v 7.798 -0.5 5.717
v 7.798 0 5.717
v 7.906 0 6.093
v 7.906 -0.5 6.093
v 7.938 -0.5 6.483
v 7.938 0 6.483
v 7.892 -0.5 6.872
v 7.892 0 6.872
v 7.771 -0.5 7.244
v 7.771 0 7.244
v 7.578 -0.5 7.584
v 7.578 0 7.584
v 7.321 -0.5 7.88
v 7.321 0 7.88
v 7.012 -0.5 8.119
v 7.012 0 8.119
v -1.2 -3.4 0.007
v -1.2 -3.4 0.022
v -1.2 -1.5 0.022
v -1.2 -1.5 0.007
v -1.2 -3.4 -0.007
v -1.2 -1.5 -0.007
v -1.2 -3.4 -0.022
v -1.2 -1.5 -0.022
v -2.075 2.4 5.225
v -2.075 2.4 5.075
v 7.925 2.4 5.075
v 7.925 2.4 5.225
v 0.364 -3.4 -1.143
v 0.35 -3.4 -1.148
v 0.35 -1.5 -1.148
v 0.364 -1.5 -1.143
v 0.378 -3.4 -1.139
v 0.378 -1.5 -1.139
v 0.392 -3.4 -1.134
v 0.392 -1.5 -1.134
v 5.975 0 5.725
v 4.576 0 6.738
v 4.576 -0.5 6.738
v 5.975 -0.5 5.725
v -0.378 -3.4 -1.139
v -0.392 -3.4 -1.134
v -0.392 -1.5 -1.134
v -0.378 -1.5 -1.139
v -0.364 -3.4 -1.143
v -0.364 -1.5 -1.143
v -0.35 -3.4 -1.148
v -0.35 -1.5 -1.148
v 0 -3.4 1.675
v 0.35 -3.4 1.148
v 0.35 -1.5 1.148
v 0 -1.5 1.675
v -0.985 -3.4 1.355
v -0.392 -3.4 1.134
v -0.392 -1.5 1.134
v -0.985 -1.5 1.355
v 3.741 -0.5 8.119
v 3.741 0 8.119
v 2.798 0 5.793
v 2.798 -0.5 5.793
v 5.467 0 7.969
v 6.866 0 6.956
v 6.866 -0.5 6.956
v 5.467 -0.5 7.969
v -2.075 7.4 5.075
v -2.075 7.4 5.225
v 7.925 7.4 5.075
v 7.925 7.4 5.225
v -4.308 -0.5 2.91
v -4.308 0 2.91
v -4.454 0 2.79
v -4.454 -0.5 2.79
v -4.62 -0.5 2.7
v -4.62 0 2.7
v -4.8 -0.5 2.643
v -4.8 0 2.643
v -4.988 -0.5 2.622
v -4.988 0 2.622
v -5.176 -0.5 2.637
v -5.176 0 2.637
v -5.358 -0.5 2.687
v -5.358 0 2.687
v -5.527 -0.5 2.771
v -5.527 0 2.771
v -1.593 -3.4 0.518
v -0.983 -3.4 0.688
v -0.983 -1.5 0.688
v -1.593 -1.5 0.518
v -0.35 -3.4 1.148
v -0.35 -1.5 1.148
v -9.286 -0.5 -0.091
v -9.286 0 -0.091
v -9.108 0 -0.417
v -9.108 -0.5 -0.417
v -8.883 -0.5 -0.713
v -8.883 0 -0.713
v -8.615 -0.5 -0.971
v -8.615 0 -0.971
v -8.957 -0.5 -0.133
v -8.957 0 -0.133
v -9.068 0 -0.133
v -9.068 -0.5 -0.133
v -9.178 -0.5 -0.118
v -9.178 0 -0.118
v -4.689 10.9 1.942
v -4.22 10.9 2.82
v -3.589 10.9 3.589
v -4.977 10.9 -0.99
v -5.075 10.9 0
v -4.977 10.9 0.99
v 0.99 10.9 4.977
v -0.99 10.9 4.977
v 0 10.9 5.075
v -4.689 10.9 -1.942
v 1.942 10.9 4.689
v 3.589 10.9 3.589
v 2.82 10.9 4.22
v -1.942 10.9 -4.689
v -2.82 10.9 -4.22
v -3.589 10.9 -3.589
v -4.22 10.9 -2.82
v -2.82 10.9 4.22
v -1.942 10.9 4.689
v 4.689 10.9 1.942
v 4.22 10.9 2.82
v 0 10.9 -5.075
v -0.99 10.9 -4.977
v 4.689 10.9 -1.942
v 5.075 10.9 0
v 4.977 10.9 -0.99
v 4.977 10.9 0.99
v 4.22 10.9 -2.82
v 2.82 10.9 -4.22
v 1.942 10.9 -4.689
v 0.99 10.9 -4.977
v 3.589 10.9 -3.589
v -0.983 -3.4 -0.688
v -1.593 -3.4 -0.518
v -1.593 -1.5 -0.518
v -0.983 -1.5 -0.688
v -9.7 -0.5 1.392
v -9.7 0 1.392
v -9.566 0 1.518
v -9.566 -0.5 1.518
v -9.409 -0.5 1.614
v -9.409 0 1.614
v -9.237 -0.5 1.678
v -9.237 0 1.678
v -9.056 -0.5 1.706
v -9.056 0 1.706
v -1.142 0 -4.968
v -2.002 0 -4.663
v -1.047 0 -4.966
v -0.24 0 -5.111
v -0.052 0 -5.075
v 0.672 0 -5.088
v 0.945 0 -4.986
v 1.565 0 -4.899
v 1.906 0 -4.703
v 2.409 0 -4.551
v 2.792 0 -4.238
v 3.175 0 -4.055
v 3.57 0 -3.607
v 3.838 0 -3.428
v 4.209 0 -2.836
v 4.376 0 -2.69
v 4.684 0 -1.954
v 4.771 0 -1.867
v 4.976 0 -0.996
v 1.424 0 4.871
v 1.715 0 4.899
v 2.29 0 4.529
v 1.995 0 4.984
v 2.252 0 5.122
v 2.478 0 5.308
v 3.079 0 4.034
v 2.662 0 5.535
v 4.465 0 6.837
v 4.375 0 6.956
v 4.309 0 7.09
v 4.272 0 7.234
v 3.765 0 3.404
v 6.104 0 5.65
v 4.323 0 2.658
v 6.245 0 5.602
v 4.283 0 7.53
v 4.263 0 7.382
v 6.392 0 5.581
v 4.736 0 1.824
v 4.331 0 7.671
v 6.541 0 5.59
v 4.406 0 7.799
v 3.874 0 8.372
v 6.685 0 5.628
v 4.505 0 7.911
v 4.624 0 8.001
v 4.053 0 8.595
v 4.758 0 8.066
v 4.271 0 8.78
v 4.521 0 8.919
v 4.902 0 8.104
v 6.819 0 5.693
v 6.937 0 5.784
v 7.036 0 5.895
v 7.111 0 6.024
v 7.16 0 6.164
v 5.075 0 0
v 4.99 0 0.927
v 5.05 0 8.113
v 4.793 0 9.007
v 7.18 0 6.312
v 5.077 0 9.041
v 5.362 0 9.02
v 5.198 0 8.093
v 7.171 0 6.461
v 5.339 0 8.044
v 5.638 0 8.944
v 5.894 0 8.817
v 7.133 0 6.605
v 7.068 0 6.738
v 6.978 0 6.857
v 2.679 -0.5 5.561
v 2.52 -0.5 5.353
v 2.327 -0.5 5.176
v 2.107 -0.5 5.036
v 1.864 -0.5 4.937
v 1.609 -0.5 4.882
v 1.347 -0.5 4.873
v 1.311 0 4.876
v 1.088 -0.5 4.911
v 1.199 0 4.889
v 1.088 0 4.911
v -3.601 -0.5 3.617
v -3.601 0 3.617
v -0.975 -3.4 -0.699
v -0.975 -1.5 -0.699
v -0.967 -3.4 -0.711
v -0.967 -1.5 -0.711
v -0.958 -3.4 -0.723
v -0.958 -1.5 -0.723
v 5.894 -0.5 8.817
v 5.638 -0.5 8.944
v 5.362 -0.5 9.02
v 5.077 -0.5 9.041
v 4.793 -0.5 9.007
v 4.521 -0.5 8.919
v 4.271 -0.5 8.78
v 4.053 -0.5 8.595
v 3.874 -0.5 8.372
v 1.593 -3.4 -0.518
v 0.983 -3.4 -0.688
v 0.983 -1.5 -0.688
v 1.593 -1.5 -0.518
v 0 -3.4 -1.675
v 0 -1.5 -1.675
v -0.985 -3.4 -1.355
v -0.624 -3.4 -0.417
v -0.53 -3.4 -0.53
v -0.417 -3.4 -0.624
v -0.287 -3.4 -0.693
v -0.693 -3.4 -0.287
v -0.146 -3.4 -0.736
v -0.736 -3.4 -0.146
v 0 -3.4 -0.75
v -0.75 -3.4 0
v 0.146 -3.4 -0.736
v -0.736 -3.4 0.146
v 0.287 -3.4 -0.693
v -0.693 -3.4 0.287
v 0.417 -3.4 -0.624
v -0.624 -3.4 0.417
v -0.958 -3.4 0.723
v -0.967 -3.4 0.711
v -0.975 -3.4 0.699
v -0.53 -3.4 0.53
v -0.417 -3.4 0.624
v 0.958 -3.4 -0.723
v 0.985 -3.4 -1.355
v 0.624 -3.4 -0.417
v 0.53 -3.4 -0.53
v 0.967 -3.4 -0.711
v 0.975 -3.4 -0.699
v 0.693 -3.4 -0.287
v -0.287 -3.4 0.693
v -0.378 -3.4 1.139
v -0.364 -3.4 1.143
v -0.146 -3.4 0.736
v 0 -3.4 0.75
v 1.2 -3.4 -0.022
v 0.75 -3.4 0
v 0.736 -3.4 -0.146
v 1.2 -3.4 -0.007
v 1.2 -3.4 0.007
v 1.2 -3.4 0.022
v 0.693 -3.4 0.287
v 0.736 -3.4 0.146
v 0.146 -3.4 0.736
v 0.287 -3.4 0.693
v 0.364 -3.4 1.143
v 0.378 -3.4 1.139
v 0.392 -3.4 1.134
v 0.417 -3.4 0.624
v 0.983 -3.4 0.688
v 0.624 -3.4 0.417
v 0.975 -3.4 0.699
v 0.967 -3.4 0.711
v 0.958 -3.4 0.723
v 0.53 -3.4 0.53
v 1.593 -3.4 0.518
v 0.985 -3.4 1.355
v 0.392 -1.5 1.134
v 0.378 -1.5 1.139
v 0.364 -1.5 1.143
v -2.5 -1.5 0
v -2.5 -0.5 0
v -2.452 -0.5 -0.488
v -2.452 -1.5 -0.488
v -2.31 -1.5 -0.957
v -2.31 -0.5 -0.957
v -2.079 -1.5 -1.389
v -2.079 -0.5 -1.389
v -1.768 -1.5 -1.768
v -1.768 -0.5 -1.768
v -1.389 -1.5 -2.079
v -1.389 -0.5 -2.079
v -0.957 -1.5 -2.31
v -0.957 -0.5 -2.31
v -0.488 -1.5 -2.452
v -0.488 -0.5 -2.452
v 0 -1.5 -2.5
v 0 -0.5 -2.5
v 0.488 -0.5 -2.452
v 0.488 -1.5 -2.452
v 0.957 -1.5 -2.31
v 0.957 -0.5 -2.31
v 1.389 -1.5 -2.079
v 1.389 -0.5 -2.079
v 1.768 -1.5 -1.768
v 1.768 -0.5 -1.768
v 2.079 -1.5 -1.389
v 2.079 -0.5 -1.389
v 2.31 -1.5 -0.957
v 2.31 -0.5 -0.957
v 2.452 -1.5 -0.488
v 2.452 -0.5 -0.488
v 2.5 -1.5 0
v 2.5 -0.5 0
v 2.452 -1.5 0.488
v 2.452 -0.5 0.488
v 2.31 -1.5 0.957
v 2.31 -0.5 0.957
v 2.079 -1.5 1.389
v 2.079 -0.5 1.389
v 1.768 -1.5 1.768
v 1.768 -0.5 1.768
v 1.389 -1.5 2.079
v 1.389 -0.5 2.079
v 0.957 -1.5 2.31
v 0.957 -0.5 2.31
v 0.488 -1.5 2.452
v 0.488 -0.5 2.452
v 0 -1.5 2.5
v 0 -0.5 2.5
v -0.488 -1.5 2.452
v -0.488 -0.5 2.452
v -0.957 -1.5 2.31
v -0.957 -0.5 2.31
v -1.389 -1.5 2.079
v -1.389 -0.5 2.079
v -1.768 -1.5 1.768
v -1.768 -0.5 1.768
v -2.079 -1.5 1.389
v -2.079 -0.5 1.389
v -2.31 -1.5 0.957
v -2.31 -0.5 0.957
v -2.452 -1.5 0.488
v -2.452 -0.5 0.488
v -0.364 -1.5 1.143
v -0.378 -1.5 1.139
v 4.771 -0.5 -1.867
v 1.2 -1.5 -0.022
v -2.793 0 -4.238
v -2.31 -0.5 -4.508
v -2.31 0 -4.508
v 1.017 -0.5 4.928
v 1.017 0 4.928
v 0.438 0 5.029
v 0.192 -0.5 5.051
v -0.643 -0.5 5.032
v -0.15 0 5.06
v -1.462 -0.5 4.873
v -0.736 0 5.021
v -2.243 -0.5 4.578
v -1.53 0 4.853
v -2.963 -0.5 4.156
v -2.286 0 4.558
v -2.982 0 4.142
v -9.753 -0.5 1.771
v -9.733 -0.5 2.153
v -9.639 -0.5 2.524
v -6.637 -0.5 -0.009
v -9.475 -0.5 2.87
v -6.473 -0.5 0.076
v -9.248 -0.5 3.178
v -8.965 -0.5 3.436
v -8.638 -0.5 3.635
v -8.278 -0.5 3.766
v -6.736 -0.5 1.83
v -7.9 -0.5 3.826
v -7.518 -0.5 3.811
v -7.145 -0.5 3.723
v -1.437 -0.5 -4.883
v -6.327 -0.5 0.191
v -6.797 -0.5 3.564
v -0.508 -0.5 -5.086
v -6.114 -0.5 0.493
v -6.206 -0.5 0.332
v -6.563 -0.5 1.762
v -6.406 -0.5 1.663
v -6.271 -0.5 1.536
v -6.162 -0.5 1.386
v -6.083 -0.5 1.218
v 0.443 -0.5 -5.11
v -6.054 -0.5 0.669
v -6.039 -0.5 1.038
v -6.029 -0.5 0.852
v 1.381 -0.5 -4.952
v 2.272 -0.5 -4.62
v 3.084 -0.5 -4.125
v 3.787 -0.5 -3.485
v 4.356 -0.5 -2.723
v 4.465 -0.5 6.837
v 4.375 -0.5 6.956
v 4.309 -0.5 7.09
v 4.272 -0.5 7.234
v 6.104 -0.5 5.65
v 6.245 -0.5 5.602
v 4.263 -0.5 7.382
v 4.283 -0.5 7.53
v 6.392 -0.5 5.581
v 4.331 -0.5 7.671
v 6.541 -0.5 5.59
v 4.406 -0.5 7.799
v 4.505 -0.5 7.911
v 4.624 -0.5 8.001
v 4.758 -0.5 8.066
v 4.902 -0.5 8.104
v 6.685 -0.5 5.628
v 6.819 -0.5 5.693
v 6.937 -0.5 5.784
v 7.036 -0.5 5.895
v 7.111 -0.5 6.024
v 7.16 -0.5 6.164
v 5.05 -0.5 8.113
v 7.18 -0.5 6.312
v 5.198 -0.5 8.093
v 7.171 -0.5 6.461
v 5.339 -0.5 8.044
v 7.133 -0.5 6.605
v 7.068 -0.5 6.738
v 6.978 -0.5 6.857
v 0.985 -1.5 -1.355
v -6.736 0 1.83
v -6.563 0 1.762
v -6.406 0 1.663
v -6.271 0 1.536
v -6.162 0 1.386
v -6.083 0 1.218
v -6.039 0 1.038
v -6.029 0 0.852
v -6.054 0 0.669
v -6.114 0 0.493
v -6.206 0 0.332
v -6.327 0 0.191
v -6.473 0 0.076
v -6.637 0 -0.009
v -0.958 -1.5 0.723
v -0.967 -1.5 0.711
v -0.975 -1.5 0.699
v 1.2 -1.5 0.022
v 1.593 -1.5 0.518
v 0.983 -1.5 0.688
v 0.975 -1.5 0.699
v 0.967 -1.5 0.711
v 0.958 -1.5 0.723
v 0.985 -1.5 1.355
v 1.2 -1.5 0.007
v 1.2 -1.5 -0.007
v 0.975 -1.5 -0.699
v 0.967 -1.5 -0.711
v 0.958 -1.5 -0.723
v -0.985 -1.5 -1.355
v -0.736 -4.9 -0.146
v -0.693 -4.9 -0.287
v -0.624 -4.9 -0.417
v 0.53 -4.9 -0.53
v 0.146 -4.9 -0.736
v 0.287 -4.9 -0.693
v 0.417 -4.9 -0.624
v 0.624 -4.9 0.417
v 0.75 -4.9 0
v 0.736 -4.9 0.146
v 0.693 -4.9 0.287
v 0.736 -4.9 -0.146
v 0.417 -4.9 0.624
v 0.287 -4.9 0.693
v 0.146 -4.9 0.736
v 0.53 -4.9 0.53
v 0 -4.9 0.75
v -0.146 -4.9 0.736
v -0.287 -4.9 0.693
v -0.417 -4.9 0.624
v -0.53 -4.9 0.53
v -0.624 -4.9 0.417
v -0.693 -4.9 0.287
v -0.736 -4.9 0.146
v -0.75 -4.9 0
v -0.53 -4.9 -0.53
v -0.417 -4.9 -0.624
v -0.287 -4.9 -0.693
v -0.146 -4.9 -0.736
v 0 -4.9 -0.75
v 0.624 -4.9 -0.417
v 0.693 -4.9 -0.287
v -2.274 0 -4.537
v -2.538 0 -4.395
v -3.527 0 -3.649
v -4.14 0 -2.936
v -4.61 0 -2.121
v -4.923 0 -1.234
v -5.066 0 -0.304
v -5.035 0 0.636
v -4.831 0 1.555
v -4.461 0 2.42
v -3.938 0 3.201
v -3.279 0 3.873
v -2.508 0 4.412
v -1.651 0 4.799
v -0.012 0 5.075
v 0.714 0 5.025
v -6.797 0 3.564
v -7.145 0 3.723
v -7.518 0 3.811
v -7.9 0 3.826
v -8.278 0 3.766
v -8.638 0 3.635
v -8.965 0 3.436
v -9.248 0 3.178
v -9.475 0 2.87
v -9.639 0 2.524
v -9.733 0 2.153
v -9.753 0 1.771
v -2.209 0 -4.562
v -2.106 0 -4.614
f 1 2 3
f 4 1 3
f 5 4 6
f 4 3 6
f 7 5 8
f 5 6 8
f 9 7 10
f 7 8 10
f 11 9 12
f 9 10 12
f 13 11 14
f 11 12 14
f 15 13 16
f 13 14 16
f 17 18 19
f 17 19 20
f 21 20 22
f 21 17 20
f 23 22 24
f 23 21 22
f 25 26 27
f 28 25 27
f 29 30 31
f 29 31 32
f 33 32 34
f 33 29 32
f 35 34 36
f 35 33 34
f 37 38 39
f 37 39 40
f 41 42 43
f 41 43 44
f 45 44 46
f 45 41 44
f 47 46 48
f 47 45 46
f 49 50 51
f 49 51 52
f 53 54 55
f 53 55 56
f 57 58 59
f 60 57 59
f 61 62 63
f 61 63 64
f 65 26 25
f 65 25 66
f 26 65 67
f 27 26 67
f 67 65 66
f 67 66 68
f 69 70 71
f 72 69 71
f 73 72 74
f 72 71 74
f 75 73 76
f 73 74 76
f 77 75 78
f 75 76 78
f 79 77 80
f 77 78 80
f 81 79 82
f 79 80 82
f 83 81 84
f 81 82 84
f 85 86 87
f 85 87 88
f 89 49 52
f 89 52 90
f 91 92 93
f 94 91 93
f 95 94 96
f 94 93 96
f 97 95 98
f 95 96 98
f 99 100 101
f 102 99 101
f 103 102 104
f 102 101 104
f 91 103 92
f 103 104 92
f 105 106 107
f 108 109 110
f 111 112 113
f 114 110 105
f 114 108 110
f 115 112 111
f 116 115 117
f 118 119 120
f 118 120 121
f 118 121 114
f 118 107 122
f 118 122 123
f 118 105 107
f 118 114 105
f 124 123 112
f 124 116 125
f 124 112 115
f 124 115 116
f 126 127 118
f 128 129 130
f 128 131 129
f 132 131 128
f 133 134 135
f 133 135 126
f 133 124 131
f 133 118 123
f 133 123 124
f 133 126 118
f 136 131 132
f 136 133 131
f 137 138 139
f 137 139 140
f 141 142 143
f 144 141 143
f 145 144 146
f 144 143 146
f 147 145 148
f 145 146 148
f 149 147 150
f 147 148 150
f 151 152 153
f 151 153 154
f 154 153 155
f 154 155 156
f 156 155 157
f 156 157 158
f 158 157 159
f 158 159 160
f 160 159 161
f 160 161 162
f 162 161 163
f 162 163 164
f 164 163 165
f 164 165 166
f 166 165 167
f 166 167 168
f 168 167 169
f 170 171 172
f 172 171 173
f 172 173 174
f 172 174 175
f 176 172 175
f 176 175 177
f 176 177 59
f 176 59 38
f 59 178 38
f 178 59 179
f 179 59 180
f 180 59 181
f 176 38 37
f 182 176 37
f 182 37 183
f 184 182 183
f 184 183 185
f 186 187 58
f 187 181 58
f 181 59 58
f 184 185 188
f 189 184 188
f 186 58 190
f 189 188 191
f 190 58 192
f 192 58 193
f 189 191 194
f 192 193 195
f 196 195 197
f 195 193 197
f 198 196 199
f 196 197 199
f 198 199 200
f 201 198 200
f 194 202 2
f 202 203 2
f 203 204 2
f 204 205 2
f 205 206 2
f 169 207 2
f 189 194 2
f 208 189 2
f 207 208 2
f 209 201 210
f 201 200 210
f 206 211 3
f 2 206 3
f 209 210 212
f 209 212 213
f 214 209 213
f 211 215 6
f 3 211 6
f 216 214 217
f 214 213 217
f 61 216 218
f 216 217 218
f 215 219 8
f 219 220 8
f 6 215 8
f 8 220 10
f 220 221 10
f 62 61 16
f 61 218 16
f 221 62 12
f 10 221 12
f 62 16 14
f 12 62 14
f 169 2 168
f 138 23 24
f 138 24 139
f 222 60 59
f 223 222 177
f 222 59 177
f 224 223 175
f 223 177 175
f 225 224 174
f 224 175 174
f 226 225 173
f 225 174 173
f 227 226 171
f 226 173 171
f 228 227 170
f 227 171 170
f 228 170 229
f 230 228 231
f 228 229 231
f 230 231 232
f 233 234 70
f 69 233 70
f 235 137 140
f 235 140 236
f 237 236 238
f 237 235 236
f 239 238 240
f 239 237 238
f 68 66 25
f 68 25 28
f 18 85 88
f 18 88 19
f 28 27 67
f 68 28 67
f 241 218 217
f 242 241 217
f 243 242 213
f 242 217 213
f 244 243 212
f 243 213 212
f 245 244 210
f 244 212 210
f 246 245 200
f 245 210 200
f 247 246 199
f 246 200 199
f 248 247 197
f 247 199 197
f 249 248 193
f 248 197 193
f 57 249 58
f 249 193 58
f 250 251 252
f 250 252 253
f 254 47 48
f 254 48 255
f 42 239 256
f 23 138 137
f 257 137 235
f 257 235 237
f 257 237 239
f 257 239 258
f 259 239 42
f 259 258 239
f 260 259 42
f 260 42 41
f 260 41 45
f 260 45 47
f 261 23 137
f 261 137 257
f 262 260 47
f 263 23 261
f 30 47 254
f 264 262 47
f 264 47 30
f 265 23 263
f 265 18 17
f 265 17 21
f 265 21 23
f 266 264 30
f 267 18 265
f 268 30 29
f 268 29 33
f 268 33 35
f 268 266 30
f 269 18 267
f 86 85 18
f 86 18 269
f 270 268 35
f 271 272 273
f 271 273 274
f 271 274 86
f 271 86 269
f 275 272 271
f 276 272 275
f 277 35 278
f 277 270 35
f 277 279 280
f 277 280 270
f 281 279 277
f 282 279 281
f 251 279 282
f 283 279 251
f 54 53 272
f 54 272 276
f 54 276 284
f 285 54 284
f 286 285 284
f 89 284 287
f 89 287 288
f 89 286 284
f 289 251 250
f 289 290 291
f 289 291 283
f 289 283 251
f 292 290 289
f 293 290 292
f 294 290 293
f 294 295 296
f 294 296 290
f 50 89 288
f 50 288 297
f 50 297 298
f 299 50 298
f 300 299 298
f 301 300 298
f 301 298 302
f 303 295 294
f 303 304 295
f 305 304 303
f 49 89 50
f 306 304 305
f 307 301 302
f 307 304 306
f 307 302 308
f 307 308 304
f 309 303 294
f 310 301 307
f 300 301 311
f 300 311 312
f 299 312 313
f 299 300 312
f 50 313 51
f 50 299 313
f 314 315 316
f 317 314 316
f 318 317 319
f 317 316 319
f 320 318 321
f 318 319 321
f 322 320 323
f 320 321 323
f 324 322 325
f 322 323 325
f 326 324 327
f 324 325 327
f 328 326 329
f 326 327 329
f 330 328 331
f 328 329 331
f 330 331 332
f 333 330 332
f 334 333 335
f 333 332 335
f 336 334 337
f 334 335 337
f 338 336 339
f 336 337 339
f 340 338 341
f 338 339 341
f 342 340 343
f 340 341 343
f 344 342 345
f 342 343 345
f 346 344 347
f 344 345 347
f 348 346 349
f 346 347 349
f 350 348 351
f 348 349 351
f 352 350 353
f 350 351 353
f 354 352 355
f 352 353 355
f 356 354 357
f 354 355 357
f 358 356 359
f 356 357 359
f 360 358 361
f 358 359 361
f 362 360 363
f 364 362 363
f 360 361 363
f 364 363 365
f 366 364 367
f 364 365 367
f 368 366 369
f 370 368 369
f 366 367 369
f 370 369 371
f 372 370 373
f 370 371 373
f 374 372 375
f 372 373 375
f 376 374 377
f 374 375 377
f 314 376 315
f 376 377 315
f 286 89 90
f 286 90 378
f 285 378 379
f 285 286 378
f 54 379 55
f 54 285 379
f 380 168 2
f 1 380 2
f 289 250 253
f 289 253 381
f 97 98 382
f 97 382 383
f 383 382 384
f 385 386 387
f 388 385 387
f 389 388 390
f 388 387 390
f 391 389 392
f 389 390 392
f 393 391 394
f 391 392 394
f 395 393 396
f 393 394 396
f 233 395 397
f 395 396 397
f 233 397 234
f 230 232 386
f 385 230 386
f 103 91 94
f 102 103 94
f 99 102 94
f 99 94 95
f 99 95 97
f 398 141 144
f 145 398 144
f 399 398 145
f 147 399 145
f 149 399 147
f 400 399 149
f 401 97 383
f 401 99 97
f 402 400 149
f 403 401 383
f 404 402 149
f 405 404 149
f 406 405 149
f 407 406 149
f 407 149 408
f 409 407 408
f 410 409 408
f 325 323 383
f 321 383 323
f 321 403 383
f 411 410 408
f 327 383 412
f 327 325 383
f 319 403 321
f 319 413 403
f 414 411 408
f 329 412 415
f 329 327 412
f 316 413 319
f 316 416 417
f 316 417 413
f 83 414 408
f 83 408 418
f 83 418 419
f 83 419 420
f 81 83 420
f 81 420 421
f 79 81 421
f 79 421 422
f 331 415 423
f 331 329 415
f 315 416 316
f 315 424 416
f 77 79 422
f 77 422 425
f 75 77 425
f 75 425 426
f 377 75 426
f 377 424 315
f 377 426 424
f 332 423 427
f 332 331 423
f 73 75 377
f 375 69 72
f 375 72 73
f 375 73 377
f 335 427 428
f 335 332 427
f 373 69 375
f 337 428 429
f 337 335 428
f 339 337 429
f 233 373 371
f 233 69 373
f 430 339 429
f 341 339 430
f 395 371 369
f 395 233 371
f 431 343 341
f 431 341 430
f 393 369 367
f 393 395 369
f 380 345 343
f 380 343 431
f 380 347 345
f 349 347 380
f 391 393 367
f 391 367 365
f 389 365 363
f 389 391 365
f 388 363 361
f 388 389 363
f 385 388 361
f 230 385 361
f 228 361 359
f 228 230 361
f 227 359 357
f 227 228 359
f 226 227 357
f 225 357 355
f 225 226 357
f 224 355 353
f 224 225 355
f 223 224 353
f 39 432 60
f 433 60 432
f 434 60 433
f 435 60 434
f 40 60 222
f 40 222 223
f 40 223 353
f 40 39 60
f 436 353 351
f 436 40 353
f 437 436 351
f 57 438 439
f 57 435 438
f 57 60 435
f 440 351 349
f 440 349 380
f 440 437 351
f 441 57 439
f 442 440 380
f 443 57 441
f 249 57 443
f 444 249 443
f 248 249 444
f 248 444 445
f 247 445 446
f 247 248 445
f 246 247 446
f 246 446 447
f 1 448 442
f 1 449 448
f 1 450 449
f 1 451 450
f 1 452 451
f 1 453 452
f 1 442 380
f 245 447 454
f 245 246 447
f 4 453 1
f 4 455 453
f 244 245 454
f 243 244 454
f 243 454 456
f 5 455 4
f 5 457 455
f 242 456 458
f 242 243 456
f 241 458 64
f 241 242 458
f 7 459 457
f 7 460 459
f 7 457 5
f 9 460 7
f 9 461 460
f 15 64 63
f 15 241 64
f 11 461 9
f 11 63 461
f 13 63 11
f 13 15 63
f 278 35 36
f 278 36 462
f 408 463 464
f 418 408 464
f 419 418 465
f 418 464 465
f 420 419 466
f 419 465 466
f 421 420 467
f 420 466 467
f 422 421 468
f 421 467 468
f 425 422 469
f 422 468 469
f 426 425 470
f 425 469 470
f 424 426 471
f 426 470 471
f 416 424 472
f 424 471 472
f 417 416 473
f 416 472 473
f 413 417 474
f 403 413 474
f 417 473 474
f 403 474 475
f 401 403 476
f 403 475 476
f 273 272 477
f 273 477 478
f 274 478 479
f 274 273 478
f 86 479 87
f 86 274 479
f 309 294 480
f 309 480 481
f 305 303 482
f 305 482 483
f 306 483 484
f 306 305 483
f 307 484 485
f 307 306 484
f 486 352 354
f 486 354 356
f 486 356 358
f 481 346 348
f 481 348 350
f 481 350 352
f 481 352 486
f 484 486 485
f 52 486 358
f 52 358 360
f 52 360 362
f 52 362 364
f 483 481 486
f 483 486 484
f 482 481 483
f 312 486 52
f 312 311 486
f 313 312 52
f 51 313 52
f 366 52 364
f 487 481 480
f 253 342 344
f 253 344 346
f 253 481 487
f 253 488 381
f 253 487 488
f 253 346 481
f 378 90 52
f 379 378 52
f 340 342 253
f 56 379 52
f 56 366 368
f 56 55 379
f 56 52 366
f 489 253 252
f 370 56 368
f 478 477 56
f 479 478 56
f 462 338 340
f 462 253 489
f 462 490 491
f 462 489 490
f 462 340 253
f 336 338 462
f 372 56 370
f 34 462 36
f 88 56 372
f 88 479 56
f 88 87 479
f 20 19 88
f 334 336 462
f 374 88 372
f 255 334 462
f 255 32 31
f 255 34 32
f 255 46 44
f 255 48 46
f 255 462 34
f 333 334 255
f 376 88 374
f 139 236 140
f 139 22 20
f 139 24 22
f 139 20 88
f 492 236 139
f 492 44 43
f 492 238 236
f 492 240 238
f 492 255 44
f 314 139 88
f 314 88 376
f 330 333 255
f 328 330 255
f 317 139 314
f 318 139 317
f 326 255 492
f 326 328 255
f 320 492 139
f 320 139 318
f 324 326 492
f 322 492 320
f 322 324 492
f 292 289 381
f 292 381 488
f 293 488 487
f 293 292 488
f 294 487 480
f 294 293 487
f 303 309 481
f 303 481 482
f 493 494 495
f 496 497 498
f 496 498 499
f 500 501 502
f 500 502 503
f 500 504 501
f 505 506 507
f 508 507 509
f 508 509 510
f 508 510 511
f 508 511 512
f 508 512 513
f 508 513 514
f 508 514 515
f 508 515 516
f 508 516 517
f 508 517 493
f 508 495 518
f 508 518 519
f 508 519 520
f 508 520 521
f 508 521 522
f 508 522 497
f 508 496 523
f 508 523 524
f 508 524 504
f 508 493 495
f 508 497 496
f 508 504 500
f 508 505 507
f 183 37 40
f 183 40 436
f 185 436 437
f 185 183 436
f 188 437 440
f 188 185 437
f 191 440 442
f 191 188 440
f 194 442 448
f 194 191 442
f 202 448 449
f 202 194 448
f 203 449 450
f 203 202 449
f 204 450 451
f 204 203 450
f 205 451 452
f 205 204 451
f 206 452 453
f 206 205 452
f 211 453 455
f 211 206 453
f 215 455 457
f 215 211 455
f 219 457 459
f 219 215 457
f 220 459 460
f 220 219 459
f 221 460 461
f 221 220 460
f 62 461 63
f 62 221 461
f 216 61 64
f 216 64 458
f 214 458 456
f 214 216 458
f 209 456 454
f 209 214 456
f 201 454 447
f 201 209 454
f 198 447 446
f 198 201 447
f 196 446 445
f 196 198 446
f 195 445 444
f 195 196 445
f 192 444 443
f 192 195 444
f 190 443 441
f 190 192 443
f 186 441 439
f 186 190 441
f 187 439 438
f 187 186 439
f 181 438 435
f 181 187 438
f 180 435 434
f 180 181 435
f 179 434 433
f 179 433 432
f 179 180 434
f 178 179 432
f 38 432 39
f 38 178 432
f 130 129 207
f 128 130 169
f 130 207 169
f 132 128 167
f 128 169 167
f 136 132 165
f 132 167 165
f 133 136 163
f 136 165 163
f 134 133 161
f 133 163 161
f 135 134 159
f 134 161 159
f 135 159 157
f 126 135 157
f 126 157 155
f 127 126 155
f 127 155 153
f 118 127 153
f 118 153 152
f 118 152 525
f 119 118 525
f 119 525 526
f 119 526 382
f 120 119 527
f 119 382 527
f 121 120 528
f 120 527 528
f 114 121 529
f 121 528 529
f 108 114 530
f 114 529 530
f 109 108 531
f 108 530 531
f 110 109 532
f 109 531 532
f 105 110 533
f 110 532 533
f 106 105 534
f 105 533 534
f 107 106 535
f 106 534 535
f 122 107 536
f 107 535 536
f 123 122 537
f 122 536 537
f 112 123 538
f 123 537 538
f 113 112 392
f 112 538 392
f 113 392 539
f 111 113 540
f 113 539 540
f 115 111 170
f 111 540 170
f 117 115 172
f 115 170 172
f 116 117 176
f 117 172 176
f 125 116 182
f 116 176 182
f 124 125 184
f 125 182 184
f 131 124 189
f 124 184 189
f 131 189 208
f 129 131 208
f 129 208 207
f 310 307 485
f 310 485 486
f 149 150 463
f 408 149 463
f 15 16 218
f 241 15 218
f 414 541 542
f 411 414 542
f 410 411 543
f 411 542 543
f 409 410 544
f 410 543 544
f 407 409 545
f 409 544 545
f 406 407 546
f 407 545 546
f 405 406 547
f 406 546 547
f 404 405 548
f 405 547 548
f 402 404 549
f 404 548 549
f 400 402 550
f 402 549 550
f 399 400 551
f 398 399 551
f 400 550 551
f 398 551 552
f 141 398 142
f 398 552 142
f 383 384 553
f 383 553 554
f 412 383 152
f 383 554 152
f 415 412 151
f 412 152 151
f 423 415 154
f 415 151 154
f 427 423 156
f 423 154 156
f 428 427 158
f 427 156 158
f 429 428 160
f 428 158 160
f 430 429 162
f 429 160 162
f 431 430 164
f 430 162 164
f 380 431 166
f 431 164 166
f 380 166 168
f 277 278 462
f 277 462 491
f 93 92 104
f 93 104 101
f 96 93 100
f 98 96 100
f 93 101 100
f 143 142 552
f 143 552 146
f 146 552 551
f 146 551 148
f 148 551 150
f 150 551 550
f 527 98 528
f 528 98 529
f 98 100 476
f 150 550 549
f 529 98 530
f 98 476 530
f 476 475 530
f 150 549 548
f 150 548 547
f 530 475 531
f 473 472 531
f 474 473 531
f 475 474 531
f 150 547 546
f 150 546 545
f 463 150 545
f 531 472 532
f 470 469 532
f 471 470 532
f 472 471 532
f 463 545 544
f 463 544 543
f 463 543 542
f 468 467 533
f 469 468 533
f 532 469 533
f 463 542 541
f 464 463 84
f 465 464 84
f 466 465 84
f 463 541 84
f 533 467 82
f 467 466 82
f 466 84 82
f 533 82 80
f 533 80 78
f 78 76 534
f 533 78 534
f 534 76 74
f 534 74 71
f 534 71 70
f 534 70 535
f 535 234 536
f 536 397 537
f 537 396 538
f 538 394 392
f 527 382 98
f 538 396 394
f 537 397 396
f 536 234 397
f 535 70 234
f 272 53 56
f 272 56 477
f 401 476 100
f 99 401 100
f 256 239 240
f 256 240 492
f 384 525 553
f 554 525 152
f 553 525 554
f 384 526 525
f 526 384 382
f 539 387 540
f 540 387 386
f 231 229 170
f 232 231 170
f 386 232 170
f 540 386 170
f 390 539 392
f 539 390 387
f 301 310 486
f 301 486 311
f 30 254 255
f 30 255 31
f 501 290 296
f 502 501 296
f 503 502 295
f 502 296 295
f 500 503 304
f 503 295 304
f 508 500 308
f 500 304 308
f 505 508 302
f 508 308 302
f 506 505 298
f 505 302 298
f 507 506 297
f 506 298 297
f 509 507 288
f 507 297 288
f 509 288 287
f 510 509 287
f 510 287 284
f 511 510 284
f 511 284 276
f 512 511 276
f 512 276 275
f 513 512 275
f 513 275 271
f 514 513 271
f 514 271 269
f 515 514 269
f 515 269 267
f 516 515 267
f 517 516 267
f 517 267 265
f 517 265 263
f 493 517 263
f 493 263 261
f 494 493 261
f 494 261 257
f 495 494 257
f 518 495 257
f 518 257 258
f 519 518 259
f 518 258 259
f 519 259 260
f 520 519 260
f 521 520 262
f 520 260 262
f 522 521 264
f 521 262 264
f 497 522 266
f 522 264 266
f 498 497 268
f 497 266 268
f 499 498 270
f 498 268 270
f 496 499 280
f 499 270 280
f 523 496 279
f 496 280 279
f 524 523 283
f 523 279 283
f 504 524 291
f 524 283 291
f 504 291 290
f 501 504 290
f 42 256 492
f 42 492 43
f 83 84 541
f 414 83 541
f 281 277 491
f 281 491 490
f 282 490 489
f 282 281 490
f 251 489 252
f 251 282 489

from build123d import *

# Parameters (mm, degrees)
SKETCH1_R           = 5.075
BOSS_EXTRUDE1_DEPTH = 10.9
BOSS_EXTRUDE2_DEPTH = 0.5
SKETCH3_R           = 2.5
BOSS_EXTRUDE3_DEPTH = 1
SKETCH5_R           = 0.75
BOSS_EXTRUDE4_DEPTH = 3.4
BOSS_EXTRUDE5_DEPTH = 2
SKETCH8_W           = 10
SKETCH8_H           = 5
BOSS_EXTRUDE6_DEPTH = 0.15


with BuildPart() as part:
    # Sketch1 → Boss-Extrude1 (new body)
    with BuildSketch(Plane(origin=(0, 0, 0), x_dir=(1, 0, 0), z_dir=(0, 1, 0))):
        Circle(SKETCH1_R)
    extrude(amount=BOSS_EXTRUDE1_DEPTH)

    # Sketch2 → Boss-Extrude2 (add)
    with BuildSketch(Plane.XZ):
        with BuildLine():
            Line((-8.61499055, -0.970557139), (-2.310436603, -4.508112409))
            ThreePointArc((-2.310436603, -4.508112409), (1.834277732, -4.807325107), (4.771008313, -1.867291323))
            Line((4.771008313, -1.867291323), (7.798198395, 5.717317641))
            ThreePointArc((7.798198395, 5.717317641), (7.840728806, 7.060924689), (7.011683711, 8.119117946))
            Line((7.011683711, 8.119117946), (5.893518828, 8.817225849))
            ThreePointArc((5.893518828, 8.817225849), (4.654897956, 8.969369461), (3.741442044, 8.119117946))
            Line((3.741442044, 8.119117946), (2.79817543, 5.793477847))
            ThreePointArc((2.79817543, 5.793477847), (2.106502755, 5.035708358), (1.088147054, 4.910899091))
            Line((1.088147054, 4.910899091), (1.017368736, 4.927662377))
            ThreePointArc((1.017368736, 4.927662377), (-1.462282513, 4.873270355), (-3.601116675, 3.617476885))
            Line((-3.601116675, 3.617476885), (-4.308276433, 2.910317127))
            ThreePointArc((-4.308276433, 2.910317127), (-4.893201601, 2.628113245), (-5.526672453, 2.771260597))
            Line((-5.526672453, 2.771260597), (-6.797004588, 3.564371627))
            ThreePointArc((-6.797004588, 3.564371627), (-8.964923009, 3.436038373), (-9.699583134, 1.392361734))
            ThreePointArc((-9.699583134, 1.392361734), (-9.409288056, 1.61420952), (-9.055569037, 1.70570011))
            Line((-9.055569037, 1.70570011), (-6.735755354, 1.829675082))
            ThreePointArc((-6.735755354, 1.829675082), (-6.029191067, 0.94531053), (-6.637476081, -0.009321909))
            Line((-6.637476081, -0.009321909), (-8.957289765, -0.133296881))
            ThreePointArc((-8.957289765, -0.133296881), (-9.12340547, -0.127148695), (-9.285709006, -0.091235044))
            ThreePointArc((-9.285709006, -0.091235044), (-9.00079149, -0.569371398), (-8.61499055, -0.970557139))
        make_face()
        with BuildLine():
            Line((4.576224529, 6.738378176), (5.975324732, 5.725280143))
            ThreePointArc((5.975324732, 5.725280143), (7.036113989, 5.895028611), (6.866365521, 6.955817868))
            Line((6.866365521, 6.955817868), (5.467265319, 7.968915901))
            ThreePointArc((5.467265319, 7.968915901), (4.406476062, 7.799167433), (4.576224529, 6.738378176))
        make_face(mode=Mode.SUBTRACT)
    extrude(amount=BOSS_EXTRUDE2_DEPTH)

    # Sketch3 → Boss-Extrude3 (add)
    with BuildSketch(Plane(origin=(0, -0.5, 0), x_dir=(-1, 0, 0), z_dir=(0, -1, 0))):
        Circle(SKETCH3_R)
    extrude(amount=BOSS_EXTRUDE3_DEPTH)

    # Sketch5 → Boss-Extrude4 (add)
    with BuildSketch(Plane.XZ.offset(1.5)):
        Circle(SKETCH5_R)
    extrude(amount=BOSS_EXTRUDE4_DEPTH)

    # Sketch6 → Boss-Extrude5 (add)
    with BuildSketch(Plane.XZ.offset(3.4)):
        with BuildLine():
            Line((0, 1.675), (-0.35, 1.147824028))
            ThreePointArc((-0.35, 1.147824028), (-0.370820393, 1.14126782), (-0.391518088, 1.134333984))
            Line((-0.391518088, 1.134333984), (-0.984540298, 1.355103466))
            Line((-0.984540298, 1.355103466), (-0.957829984, 0.722884307))
            ThreePointArc((-0.957829984, 0.722884307), (-0.970820393, 0.705342303), (-0.983489574, 0.687566912))
            Line((-0.983489574, 0.687566912), (-1.593019665, 0.517603466))
            Line((-1.593019665, 0.517603466), (-1.19980147, 0.021827351))
            ThreePointArc((-1.19980147, 0.021827351), (-1.2, 0), (-1.19980147, -0.021827351))
            Line((-1.19980147, -0.021827351), (-1.593019665, -0.517603466))
            Line((-1.593019665, -0.517603466), (-0.983489574, -0.687566912))
            ThreePointArc((-0.983489574, -0.687566912), (-0.970820393, -0.705342303), (-0.957829984, -0.722884307))
            Line((-0.957829984, -0.722884307), (-0.984540298, -1.355103466))
            Line((-0.984540298, -1.355103466), (-0.391518088, -1.134333984))
            ThreePointArc((-0.391518088, -1.134333984), (-0.370820393, -1.14126782), (-0.35, -1.147824028))
            Line((-0.35, -1.147824028), (0, -1.675))
            Line((0, -1.675), (0.35, -1.147824028))
            ThreePointArc((0.35, -1.147824028), (0.370820393, -1.14126782), (0.391518088, -1.134333984))
            Line((0.391518088, -1.134333984), (0.984540298, -1.355103466))
            Line((0.984540298, -1.355103466), (0.957829984, -0.722884307))
            ThreePointArc((0.957829984, -0.722884307), (0.970820393, -0.705342303), (0.983489574, -0.687566912))
            Line((0.983489574, -0.687566912), (1.593019665, -0.517603466))
            Line((1.593019665, -0.517603466), (1.19980147, -0.021827351))
            ThreePointArc((1.19980147, -0.021827351), (1.2, 0), (1.19980147, 0.021827351))
            Line((1.19980147, 0.021827351), (1.593019665, 0.517603466))
            Line((1.593019665, 0.517603466), (0.983489574, 0.687566912))
            ThreePointArc((0.983489574, 0.687566912), (0.970820393, 0.705342303), (0.957829984, 0.722884307))
            Line((0.957829984, 0.722884307), (0.984540298, 1.355103466))
            Line((0.984540298, 1.355103466), (0.391518088, 1.134333984))
            ThreePointArc((0.391518088, 1.134333984), (0.370820393, 1.14126782), (0.35, 1.147824028))
            Line((0.35, 1.147824028), (0, 1.675))
        make_face()
    extrude(amount=-BOSS_EXTRUDE5_DEPTH)


with BuildPart() as body_2:
    # Sketch8 → Boss-Extrude6 (new body)
    with BuildSketch(Plane.XY.offset(5.075)):
        with Locations((2.925, 4.9)):
            Rectangle(SKETCH8_W, SKETCH8_H)
    extrude(amount=BOSS_EXTRUDE6_DEPTH)


solid = Compound([part.part, body_2.part])
